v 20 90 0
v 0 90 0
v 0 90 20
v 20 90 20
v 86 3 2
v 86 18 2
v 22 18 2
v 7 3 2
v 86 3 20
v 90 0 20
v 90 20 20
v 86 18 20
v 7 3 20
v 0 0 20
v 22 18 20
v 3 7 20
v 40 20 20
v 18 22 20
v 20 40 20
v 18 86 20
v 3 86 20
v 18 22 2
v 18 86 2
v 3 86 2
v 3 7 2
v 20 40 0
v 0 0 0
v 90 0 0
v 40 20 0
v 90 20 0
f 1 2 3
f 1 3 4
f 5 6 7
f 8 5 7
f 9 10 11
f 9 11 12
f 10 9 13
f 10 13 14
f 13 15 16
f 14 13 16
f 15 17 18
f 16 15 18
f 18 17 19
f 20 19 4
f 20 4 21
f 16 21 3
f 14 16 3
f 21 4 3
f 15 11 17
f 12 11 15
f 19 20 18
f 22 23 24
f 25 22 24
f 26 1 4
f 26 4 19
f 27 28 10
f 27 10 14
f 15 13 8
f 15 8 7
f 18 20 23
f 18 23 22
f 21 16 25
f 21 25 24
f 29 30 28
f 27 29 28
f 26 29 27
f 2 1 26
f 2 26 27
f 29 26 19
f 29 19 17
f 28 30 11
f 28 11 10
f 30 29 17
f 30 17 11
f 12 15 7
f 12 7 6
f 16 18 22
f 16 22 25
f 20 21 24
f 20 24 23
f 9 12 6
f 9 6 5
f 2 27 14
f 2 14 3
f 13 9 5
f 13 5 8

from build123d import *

# Parameters (mm, degrees)
PAD_DEPTH    = 20
POCKET_DEPTH = 18


with BuildPart() as part:
    # Sketch → Pad (new body)
    with BuildSketch(Plane.XY):
        Polygon((0, 0), (0, 90), (20, 90), (20, 40.00002), (40, 20), (90, 20), (90, 0), align=None)
    extrude(amount=PAD_DEPTH)

    # Sketch001 → Pocket (cut)
    with BuildSketch(Plane.XY.offset(20)):
        Polygon((3, 7), (3, 86), (18, 86), (18, 22.000015), align=None)
        Polygon((21.999985, 18), (86, 18), (86, 3), (7, 3), align=None)
    extrude(amount=-POCKET_DEPTH, mode=Mode.SUBTRACT)


solid = part.part
